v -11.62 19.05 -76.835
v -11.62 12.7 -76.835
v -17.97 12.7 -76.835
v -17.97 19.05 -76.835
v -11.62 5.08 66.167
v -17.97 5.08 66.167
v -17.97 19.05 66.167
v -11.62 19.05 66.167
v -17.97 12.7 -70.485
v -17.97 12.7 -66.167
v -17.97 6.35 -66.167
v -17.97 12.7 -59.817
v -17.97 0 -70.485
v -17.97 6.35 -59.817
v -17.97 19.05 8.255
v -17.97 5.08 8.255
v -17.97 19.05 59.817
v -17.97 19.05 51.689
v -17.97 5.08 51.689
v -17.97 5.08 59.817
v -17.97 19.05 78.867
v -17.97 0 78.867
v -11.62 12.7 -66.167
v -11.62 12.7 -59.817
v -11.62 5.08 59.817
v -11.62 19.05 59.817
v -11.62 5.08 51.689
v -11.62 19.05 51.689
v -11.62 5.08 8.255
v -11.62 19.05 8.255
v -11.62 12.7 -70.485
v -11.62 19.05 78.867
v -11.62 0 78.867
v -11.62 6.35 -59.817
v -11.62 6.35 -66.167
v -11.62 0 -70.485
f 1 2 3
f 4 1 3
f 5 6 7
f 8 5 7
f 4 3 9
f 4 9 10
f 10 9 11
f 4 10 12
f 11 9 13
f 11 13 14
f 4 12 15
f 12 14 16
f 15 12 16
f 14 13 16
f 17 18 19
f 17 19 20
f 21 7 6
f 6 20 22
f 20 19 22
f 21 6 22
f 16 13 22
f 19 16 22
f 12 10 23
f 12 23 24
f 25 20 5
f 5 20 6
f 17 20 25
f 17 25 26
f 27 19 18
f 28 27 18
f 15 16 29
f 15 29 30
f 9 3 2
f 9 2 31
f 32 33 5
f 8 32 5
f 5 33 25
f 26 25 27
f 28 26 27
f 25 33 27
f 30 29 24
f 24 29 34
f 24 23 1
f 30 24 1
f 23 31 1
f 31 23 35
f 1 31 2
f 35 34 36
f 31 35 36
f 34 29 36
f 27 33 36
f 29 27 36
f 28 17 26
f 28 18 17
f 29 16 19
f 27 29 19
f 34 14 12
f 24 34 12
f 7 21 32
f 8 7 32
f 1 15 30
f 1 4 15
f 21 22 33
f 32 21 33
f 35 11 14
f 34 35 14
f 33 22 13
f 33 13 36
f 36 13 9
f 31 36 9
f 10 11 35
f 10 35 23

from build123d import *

# Parameters (mm, degrees)
BOSS_EXTRUDE1_DEPTH = 19.05
SKETCH2_W           = 43.434
SKETCH2_H           = 13.97
MOTOR_HOLE_DEPTH    = 19.05
SKETCH3_W           = 6.35
SKETCH3_H           = 12.7
CUT_EXTRUDE2_DEPTH  = 36.941
SKETCH5_W           = 6.35
SKETCH5_H           = 13.97
SKETCH5_H_2         = 6.35
CUT_EXTRUDE6_DEPTH  = 36.941
SKETCH7_W           = 50.257507562
SKETCH7_H           = 159.787423729
CUT_EXTRUDE7_DEPTH  = 20.05


with BuildPart() as part:
    # Sketch1 → Boss-Extrude1 (new body)
    with BuildSketch(Plane(origin=(0, 0, 0), x_dir=(1, 0, 0), z_dir=(0, 1, 0))):
        Polygon((-10.033, 66.167), (-11.6205, 66.167), (-11.6205, 76.835), (-17.9705, 76.835), (-17.9705, -78.867), (-11.6205, -78.867), (-11.6205, -66.167), (11.6205, -66.167), (11.6205, -78.867), (17.9705, -78.867), (17.9705, 76.835), (11.6205, 76.835), (11.6205, 66.167), (10.033, 66.167), (10.033, 59.817), (11.6205, 59.817), (11.6205, -59.817), (-11.6205, -59.817), (-11.6205, 59.817), (-10.033, 59.817), align=None)
    extrude(amount=BOSS_EXTRUDE1_DEPTH)

    # Sketch2 → Motor Hole (cut)
    with BuildSketch(Plane.ZY.offset(17.9705)):
        with Locations((29.972, 12.065)):
            Rectangle(SKETCH2_W, SKETCH2_H)
    extrude(amount=-MOTOR_HOLE_DEPTH, mode=Mode.SUBTRACT)

    # Sketch3 → Cut-Extrude2 (cut, through all)
    with BuildSketch(Plane.ZY.offset(17.9705)):
        with Locations((-73.66, 6.35)):
            Rectangle(SKETCH3_W, SKETCH3_H)
    extrude(amount=-CUT_EXTRUDE2_DEPTH, mode=Mode.SUBTRACT)

    # Sketch5 → Cut-Extrude6 (cut, through all)
    with BuildSketch(Plane.ZY.offset(17.9705)):
        with Locations((62.992, 12.065)):
            Rectangle(SKETCH5_W, SKETCH5_H)
        with Locations((-62.992, 9.525)):
            Rectangle(SKETCH5_W, SKETCH5_H_2)
    extrude(amount=-CUT_EXTRUDE6_DEPTH, mode=Mode.SUBTRACT)

    # Sketch7 → Cut-Extrude7 (cut, through all)
    with BuildSketch(Plane(origin=(0, 0, 0), x_dir=(1, 0, 0), z_dir=(0, 1, 0))):
        with Locations((13.508253781, 1.026711865)):
            Rectangle(SKETCH7_W, SKETCH7_H)
    extrude(amount=CUT_EXTRUDE7_DEPTH, mode=Mode.SUBTRACT)


solid = part.part
